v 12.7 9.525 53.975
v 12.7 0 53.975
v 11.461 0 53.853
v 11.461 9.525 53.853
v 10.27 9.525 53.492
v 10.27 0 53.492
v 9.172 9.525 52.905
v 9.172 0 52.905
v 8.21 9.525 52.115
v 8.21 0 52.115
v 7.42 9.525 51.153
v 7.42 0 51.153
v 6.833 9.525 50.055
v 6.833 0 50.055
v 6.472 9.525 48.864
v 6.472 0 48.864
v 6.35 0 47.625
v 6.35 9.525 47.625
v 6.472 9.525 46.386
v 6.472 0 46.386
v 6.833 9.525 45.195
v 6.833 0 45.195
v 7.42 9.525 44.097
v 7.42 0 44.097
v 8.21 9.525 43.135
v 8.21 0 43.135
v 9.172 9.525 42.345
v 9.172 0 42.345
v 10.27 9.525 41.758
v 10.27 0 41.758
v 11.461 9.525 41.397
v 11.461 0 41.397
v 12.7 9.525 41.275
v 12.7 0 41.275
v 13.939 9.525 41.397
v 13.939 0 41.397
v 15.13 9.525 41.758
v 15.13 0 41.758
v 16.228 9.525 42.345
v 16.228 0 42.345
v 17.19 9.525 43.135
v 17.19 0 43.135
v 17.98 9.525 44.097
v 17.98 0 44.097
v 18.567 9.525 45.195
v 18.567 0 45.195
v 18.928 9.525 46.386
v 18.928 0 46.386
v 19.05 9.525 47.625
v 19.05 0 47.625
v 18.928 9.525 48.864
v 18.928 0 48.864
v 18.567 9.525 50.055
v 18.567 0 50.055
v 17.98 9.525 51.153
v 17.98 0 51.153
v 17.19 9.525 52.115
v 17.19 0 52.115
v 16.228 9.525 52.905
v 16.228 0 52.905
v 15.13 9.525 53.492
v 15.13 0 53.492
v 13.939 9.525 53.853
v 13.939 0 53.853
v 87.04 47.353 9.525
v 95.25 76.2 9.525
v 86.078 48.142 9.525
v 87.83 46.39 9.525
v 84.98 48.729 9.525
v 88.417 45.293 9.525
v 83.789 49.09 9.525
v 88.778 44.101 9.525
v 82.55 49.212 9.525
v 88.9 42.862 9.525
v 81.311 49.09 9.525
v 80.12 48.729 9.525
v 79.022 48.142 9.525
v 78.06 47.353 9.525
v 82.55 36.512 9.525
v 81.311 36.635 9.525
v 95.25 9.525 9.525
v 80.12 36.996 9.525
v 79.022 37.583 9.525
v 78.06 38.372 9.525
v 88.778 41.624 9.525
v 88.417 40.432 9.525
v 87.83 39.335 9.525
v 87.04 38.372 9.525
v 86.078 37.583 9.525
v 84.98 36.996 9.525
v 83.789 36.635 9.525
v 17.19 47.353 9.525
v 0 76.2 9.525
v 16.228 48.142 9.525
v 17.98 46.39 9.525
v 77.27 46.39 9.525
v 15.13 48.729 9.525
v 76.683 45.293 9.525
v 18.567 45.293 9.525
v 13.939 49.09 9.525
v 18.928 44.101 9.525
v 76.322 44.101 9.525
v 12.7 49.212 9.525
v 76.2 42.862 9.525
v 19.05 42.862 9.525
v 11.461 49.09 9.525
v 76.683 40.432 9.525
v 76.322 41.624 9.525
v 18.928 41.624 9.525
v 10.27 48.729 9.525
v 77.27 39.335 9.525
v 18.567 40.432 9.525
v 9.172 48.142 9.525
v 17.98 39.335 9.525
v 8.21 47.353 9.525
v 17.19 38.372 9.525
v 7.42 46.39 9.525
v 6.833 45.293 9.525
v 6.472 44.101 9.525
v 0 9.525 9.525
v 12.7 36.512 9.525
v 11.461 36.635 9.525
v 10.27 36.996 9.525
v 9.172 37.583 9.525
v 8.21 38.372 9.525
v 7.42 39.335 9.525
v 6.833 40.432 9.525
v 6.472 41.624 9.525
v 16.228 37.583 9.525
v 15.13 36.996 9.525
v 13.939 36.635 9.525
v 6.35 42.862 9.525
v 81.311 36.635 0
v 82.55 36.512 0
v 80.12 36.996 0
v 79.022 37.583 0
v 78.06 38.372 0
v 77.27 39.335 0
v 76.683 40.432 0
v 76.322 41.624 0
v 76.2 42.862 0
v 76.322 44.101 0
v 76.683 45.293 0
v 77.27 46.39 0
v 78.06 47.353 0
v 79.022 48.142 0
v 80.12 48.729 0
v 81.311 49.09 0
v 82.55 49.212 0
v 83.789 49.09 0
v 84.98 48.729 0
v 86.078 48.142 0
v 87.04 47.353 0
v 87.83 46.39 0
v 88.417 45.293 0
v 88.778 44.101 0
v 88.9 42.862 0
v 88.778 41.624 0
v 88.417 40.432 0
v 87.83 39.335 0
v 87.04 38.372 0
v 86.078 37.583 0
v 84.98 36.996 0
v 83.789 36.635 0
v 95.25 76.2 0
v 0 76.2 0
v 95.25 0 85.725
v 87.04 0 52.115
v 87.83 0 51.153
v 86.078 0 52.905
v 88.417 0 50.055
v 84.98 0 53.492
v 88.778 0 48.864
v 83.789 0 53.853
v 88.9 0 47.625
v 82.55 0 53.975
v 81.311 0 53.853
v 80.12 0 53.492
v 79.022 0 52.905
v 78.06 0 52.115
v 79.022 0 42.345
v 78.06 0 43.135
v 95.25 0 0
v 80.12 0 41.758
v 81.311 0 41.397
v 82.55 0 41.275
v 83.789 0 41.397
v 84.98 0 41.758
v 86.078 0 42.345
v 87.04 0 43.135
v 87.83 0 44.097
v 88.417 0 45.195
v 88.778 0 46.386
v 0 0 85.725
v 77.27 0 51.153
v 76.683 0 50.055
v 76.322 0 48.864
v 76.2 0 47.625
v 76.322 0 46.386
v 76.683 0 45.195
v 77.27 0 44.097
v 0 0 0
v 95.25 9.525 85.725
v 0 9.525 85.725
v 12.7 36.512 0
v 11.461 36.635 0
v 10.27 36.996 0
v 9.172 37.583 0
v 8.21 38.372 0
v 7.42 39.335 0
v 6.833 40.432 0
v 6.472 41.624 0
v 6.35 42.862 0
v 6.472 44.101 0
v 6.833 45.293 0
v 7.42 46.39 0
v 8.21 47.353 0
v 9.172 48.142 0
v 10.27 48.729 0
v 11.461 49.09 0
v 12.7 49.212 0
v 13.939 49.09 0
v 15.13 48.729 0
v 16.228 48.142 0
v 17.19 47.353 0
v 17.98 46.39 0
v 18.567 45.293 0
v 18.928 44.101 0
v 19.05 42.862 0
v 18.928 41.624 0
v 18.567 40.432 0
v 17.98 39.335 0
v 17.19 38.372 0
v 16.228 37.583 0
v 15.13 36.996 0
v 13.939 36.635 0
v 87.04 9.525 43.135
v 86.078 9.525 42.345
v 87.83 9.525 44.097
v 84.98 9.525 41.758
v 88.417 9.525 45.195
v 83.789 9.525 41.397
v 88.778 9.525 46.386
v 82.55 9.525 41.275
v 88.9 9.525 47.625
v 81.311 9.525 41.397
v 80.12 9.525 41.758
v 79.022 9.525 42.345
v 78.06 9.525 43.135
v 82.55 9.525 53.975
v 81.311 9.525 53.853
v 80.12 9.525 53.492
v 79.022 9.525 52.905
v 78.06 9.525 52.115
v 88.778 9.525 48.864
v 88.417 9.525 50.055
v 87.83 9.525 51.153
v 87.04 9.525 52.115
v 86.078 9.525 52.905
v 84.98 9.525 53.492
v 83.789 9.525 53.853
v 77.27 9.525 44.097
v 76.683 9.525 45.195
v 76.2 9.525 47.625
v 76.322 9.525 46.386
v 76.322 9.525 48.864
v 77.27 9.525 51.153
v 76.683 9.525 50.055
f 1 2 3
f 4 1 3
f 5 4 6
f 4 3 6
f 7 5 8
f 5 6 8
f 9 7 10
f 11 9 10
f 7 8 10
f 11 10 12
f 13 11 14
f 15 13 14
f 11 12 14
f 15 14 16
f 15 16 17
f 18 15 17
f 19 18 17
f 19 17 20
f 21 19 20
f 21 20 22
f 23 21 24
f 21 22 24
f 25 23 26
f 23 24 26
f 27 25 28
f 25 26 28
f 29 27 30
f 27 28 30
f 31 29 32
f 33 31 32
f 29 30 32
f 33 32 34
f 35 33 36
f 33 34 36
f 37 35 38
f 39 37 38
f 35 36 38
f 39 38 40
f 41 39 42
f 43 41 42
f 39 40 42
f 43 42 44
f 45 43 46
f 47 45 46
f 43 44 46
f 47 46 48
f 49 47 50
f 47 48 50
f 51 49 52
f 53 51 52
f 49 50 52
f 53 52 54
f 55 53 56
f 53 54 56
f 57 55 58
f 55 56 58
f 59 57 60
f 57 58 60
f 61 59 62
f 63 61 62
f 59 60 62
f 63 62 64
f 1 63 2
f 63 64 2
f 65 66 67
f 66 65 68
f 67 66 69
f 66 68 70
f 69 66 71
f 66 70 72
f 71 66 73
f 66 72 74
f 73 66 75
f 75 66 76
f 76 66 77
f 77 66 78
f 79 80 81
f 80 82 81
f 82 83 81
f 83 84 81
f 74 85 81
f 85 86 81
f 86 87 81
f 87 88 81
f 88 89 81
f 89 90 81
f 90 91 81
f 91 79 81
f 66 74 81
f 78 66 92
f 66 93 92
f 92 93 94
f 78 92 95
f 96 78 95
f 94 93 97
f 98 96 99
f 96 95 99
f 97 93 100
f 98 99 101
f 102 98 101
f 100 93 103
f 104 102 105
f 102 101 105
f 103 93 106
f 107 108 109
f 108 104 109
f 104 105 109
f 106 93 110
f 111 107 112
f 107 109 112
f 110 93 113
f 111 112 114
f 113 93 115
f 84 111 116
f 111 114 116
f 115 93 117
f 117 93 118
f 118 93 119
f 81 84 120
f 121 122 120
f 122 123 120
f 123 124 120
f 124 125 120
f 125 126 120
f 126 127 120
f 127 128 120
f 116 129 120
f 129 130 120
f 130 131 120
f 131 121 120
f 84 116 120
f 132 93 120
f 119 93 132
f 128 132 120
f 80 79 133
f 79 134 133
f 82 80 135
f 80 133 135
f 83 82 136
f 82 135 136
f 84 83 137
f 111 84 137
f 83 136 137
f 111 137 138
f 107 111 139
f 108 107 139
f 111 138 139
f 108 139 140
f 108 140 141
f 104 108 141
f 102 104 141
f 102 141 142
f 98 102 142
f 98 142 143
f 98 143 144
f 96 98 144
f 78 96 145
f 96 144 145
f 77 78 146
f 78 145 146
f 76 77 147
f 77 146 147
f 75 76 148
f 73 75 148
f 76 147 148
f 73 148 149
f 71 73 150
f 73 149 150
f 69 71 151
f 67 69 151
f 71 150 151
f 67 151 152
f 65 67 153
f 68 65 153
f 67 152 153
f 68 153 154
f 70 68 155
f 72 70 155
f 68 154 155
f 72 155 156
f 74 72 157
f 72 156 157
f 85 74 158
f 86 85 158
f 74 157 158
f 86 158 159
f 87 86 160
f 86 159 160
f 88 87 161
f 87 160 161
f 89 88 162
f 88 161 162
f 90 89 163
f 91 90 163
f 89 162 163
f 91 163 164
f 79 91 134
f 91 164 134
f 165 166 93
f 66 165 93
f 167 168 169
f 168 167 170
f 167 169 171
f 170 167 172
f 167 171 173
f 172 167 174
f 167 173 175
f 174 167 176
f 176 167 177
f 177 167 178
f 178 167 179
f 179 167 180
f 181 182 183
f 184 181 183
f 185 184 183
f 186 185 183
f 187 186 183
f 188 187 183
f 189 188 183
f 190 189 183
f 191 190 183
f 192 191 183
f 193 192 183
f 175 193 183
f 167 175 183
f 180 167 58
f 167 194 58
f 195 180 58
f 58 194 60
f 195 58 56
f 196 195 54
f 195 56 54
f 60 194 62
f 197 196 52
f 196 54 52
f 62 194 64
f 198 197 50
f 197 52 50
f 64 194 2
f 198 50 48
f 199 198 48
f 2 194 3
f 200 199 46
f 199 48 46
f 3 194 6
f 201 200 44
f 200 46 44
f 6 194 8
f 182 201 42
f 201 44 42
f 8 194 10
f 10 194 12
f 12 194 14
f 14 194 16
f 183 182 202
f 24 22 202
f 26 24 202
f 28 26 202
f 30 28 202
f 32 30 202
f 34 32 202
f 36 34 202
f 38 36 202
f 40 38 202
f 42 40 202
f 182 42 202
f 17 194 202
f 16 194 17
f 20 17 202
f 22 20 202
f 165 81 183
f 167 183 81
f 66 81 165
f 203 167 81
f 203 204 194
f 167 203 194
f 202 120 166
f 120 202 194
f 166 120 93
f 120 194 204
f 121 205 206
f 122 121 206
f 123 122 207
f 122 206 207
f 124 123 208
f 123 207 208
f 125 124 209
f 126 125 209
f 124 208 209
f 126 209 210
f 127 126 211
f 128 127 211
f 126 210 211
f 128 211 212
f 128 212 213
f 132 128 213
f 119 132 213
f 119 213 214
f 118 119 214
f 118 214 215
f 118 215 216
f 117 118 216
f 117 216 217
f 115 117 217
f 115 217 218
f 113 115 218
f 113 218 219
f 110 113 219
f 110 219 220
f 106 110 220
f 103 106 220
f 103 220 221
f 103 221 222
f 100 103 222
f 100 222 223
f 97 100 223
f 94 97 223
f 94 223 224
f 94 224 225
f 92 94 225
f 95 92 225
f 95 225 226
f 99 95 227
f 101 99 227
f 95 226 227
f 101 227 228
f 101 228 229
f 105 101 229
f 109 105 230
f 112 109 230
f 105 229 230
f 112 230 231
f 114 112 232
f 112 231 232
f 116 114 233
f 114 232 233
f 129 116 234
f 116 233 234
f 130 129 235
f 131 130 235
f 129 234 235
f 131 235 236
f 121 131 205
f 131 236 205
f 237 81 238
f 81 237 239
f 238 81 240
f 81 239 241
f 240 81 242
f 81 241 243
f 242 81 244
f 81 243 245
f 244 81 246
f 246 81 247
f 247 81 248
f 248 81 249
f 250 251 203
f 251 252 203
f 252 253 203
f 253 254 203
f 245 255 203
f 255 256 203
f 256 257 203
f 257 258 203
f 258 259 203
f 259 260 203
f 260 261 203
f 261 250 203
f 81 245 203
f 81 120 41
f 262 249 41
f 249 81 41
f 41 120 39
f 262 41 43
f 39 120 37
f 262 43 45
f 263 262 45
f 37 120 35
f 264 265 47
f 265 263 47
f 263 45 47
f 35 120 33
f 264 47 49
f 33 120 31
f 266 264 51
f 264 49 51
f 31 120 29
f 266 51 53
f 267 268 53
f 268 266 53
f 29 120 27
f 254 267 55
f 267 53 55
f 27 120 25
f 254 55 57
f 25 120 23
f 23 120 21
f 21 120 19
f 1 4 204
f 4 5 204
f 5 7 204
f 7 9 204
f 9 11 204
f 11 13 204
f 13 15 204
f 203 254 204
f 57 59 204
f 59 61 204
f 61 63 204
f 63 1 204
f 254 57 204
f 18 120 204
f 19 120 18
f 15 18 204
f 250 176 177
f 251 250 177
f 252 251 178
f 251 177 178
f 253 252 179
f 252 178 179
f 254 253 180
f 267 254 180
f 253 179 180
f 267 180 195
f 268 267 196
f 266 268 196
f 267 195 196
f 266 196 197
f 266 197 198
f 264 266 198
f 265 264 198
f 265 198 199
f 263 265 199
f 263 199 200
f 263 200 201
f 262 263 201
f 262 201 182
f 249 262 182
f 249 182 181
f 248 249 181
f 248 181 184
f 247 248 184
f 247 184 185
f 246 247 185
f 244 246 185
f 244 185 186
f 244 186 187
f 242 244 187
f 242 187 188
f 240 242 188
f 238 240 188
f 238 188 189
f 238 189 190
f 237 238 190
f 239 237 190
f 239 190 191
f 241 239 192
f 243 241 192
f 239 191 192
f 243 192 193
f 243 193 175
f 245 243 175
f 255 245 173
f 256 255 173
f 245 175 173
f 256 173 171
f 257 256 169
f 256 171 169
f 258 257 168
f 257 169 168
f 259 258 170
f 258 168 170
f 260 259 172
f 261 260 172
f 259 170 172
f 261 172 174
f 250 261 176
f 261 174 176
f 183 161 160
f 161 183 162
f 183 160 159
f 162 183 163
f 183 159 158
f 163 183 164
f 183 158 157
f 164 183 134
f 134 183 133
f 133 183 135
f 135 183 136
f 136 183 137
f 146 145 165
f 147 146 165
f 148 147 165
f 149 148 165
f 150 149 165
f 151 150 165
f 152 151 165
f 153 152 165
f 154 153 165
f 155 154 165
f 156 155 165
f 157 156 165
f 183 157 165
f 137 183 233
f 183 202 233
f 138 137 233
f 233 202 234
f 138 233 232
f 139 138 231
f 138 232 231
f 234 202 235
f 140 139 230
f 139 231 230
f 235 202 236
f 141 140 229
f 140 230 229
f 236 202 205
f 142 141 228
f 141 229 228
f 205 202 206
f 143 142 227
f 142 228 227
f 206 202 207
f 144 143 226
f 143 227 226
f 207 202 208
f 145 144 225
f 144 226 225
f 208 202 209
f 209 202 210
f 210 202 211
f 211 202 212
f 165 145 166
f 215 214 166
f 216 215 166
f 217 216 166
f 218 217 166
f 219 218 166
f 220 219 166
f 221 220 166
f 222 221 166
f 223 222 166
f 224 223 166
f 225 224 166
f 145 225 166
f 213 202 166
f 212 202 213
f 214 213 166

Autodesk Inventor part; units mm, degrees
ref_plane "YZ Plane" through (0, 0, 0) normal (1, 0, 0) x (0, 1, 0)
ref_plane "XZ Plane" through (0, 0, 0) normal (0, 1, 0) x (-1, 0, 0)
ref_plane "XY Plane" through (0, 0, 0) normal (0, 0, 1) x (1, 0, 0)
sketch "Sketch1" plane through (0, 0, 0) normal (1, 0, 0) x (0, 1, 0)
  line L0 (0, 0) -> (76.2, 0)
  line L1 (76.2, 0) -> (76.2, 9.525)
  line L2 (76.2, 9.525) -> (9.525, 9.525)
  line L3 (0, 9.525) -> (0, 0)
  line L4 (9.525, 9.525) -> (9.525, 85.725)
  line L5 (9.525, 85.725) -> (0, 85.725)
  line L6 (0, 85.725) -> (0, 9.525)
  dimension "d4" = 76.2
  dimension "d5" = 9.525
  dimension "d6" = 9.525
  dimension "d7" = 76.2
extrude "Extrusion1" add sketch "Sketch1" along normal blind 95.25
sketch "Sketch2" plane through (0, 9.525, 85.725) normal (0, 1, 0) x (1, 0, 0)
  line L0 (95.25, 76.2) -> (95.25, 0) projected
  circle A0 centre (82.55, 38.1) radius 4.4901
  circle A1 centre (12.7, 38.1) radius 5.7238
  point P0 (0, 85.725)
  dimension "d13" = 12.7
  dimension "d14" = 69.85
hole "Hole1" at (12.7, 9.525, 47.625) at (82.55, 9.525, 47.625) direction (0, -1, 0) diameter 12.7 depth 25.4 tip angle 118
sketch "Sketch3" plane through (0, 9.525, 9.525) normal (0, 0, 1) x (1, 0, 0)
  line L0 (95.25, 66.675) -> (95.25, 0) projected
  circle A0 centre (82.55, 33.3375) radius 4.4901
  circle A1 centre (12.7, 33.3375) radius 3.5498
  point P0 (0, -9.525)
  dimension "d22" = 12.7
  dimension "d23" = 69.85
hole "Hole2" at (12.7, 42.8625, 9.525) at (82.55, 42.8625, 9.525) direction (0, 0, -1) diameter 12.7 depth 25.4 tip angle 118
properties part number "0wrab" material "Steel, Galvanized"
